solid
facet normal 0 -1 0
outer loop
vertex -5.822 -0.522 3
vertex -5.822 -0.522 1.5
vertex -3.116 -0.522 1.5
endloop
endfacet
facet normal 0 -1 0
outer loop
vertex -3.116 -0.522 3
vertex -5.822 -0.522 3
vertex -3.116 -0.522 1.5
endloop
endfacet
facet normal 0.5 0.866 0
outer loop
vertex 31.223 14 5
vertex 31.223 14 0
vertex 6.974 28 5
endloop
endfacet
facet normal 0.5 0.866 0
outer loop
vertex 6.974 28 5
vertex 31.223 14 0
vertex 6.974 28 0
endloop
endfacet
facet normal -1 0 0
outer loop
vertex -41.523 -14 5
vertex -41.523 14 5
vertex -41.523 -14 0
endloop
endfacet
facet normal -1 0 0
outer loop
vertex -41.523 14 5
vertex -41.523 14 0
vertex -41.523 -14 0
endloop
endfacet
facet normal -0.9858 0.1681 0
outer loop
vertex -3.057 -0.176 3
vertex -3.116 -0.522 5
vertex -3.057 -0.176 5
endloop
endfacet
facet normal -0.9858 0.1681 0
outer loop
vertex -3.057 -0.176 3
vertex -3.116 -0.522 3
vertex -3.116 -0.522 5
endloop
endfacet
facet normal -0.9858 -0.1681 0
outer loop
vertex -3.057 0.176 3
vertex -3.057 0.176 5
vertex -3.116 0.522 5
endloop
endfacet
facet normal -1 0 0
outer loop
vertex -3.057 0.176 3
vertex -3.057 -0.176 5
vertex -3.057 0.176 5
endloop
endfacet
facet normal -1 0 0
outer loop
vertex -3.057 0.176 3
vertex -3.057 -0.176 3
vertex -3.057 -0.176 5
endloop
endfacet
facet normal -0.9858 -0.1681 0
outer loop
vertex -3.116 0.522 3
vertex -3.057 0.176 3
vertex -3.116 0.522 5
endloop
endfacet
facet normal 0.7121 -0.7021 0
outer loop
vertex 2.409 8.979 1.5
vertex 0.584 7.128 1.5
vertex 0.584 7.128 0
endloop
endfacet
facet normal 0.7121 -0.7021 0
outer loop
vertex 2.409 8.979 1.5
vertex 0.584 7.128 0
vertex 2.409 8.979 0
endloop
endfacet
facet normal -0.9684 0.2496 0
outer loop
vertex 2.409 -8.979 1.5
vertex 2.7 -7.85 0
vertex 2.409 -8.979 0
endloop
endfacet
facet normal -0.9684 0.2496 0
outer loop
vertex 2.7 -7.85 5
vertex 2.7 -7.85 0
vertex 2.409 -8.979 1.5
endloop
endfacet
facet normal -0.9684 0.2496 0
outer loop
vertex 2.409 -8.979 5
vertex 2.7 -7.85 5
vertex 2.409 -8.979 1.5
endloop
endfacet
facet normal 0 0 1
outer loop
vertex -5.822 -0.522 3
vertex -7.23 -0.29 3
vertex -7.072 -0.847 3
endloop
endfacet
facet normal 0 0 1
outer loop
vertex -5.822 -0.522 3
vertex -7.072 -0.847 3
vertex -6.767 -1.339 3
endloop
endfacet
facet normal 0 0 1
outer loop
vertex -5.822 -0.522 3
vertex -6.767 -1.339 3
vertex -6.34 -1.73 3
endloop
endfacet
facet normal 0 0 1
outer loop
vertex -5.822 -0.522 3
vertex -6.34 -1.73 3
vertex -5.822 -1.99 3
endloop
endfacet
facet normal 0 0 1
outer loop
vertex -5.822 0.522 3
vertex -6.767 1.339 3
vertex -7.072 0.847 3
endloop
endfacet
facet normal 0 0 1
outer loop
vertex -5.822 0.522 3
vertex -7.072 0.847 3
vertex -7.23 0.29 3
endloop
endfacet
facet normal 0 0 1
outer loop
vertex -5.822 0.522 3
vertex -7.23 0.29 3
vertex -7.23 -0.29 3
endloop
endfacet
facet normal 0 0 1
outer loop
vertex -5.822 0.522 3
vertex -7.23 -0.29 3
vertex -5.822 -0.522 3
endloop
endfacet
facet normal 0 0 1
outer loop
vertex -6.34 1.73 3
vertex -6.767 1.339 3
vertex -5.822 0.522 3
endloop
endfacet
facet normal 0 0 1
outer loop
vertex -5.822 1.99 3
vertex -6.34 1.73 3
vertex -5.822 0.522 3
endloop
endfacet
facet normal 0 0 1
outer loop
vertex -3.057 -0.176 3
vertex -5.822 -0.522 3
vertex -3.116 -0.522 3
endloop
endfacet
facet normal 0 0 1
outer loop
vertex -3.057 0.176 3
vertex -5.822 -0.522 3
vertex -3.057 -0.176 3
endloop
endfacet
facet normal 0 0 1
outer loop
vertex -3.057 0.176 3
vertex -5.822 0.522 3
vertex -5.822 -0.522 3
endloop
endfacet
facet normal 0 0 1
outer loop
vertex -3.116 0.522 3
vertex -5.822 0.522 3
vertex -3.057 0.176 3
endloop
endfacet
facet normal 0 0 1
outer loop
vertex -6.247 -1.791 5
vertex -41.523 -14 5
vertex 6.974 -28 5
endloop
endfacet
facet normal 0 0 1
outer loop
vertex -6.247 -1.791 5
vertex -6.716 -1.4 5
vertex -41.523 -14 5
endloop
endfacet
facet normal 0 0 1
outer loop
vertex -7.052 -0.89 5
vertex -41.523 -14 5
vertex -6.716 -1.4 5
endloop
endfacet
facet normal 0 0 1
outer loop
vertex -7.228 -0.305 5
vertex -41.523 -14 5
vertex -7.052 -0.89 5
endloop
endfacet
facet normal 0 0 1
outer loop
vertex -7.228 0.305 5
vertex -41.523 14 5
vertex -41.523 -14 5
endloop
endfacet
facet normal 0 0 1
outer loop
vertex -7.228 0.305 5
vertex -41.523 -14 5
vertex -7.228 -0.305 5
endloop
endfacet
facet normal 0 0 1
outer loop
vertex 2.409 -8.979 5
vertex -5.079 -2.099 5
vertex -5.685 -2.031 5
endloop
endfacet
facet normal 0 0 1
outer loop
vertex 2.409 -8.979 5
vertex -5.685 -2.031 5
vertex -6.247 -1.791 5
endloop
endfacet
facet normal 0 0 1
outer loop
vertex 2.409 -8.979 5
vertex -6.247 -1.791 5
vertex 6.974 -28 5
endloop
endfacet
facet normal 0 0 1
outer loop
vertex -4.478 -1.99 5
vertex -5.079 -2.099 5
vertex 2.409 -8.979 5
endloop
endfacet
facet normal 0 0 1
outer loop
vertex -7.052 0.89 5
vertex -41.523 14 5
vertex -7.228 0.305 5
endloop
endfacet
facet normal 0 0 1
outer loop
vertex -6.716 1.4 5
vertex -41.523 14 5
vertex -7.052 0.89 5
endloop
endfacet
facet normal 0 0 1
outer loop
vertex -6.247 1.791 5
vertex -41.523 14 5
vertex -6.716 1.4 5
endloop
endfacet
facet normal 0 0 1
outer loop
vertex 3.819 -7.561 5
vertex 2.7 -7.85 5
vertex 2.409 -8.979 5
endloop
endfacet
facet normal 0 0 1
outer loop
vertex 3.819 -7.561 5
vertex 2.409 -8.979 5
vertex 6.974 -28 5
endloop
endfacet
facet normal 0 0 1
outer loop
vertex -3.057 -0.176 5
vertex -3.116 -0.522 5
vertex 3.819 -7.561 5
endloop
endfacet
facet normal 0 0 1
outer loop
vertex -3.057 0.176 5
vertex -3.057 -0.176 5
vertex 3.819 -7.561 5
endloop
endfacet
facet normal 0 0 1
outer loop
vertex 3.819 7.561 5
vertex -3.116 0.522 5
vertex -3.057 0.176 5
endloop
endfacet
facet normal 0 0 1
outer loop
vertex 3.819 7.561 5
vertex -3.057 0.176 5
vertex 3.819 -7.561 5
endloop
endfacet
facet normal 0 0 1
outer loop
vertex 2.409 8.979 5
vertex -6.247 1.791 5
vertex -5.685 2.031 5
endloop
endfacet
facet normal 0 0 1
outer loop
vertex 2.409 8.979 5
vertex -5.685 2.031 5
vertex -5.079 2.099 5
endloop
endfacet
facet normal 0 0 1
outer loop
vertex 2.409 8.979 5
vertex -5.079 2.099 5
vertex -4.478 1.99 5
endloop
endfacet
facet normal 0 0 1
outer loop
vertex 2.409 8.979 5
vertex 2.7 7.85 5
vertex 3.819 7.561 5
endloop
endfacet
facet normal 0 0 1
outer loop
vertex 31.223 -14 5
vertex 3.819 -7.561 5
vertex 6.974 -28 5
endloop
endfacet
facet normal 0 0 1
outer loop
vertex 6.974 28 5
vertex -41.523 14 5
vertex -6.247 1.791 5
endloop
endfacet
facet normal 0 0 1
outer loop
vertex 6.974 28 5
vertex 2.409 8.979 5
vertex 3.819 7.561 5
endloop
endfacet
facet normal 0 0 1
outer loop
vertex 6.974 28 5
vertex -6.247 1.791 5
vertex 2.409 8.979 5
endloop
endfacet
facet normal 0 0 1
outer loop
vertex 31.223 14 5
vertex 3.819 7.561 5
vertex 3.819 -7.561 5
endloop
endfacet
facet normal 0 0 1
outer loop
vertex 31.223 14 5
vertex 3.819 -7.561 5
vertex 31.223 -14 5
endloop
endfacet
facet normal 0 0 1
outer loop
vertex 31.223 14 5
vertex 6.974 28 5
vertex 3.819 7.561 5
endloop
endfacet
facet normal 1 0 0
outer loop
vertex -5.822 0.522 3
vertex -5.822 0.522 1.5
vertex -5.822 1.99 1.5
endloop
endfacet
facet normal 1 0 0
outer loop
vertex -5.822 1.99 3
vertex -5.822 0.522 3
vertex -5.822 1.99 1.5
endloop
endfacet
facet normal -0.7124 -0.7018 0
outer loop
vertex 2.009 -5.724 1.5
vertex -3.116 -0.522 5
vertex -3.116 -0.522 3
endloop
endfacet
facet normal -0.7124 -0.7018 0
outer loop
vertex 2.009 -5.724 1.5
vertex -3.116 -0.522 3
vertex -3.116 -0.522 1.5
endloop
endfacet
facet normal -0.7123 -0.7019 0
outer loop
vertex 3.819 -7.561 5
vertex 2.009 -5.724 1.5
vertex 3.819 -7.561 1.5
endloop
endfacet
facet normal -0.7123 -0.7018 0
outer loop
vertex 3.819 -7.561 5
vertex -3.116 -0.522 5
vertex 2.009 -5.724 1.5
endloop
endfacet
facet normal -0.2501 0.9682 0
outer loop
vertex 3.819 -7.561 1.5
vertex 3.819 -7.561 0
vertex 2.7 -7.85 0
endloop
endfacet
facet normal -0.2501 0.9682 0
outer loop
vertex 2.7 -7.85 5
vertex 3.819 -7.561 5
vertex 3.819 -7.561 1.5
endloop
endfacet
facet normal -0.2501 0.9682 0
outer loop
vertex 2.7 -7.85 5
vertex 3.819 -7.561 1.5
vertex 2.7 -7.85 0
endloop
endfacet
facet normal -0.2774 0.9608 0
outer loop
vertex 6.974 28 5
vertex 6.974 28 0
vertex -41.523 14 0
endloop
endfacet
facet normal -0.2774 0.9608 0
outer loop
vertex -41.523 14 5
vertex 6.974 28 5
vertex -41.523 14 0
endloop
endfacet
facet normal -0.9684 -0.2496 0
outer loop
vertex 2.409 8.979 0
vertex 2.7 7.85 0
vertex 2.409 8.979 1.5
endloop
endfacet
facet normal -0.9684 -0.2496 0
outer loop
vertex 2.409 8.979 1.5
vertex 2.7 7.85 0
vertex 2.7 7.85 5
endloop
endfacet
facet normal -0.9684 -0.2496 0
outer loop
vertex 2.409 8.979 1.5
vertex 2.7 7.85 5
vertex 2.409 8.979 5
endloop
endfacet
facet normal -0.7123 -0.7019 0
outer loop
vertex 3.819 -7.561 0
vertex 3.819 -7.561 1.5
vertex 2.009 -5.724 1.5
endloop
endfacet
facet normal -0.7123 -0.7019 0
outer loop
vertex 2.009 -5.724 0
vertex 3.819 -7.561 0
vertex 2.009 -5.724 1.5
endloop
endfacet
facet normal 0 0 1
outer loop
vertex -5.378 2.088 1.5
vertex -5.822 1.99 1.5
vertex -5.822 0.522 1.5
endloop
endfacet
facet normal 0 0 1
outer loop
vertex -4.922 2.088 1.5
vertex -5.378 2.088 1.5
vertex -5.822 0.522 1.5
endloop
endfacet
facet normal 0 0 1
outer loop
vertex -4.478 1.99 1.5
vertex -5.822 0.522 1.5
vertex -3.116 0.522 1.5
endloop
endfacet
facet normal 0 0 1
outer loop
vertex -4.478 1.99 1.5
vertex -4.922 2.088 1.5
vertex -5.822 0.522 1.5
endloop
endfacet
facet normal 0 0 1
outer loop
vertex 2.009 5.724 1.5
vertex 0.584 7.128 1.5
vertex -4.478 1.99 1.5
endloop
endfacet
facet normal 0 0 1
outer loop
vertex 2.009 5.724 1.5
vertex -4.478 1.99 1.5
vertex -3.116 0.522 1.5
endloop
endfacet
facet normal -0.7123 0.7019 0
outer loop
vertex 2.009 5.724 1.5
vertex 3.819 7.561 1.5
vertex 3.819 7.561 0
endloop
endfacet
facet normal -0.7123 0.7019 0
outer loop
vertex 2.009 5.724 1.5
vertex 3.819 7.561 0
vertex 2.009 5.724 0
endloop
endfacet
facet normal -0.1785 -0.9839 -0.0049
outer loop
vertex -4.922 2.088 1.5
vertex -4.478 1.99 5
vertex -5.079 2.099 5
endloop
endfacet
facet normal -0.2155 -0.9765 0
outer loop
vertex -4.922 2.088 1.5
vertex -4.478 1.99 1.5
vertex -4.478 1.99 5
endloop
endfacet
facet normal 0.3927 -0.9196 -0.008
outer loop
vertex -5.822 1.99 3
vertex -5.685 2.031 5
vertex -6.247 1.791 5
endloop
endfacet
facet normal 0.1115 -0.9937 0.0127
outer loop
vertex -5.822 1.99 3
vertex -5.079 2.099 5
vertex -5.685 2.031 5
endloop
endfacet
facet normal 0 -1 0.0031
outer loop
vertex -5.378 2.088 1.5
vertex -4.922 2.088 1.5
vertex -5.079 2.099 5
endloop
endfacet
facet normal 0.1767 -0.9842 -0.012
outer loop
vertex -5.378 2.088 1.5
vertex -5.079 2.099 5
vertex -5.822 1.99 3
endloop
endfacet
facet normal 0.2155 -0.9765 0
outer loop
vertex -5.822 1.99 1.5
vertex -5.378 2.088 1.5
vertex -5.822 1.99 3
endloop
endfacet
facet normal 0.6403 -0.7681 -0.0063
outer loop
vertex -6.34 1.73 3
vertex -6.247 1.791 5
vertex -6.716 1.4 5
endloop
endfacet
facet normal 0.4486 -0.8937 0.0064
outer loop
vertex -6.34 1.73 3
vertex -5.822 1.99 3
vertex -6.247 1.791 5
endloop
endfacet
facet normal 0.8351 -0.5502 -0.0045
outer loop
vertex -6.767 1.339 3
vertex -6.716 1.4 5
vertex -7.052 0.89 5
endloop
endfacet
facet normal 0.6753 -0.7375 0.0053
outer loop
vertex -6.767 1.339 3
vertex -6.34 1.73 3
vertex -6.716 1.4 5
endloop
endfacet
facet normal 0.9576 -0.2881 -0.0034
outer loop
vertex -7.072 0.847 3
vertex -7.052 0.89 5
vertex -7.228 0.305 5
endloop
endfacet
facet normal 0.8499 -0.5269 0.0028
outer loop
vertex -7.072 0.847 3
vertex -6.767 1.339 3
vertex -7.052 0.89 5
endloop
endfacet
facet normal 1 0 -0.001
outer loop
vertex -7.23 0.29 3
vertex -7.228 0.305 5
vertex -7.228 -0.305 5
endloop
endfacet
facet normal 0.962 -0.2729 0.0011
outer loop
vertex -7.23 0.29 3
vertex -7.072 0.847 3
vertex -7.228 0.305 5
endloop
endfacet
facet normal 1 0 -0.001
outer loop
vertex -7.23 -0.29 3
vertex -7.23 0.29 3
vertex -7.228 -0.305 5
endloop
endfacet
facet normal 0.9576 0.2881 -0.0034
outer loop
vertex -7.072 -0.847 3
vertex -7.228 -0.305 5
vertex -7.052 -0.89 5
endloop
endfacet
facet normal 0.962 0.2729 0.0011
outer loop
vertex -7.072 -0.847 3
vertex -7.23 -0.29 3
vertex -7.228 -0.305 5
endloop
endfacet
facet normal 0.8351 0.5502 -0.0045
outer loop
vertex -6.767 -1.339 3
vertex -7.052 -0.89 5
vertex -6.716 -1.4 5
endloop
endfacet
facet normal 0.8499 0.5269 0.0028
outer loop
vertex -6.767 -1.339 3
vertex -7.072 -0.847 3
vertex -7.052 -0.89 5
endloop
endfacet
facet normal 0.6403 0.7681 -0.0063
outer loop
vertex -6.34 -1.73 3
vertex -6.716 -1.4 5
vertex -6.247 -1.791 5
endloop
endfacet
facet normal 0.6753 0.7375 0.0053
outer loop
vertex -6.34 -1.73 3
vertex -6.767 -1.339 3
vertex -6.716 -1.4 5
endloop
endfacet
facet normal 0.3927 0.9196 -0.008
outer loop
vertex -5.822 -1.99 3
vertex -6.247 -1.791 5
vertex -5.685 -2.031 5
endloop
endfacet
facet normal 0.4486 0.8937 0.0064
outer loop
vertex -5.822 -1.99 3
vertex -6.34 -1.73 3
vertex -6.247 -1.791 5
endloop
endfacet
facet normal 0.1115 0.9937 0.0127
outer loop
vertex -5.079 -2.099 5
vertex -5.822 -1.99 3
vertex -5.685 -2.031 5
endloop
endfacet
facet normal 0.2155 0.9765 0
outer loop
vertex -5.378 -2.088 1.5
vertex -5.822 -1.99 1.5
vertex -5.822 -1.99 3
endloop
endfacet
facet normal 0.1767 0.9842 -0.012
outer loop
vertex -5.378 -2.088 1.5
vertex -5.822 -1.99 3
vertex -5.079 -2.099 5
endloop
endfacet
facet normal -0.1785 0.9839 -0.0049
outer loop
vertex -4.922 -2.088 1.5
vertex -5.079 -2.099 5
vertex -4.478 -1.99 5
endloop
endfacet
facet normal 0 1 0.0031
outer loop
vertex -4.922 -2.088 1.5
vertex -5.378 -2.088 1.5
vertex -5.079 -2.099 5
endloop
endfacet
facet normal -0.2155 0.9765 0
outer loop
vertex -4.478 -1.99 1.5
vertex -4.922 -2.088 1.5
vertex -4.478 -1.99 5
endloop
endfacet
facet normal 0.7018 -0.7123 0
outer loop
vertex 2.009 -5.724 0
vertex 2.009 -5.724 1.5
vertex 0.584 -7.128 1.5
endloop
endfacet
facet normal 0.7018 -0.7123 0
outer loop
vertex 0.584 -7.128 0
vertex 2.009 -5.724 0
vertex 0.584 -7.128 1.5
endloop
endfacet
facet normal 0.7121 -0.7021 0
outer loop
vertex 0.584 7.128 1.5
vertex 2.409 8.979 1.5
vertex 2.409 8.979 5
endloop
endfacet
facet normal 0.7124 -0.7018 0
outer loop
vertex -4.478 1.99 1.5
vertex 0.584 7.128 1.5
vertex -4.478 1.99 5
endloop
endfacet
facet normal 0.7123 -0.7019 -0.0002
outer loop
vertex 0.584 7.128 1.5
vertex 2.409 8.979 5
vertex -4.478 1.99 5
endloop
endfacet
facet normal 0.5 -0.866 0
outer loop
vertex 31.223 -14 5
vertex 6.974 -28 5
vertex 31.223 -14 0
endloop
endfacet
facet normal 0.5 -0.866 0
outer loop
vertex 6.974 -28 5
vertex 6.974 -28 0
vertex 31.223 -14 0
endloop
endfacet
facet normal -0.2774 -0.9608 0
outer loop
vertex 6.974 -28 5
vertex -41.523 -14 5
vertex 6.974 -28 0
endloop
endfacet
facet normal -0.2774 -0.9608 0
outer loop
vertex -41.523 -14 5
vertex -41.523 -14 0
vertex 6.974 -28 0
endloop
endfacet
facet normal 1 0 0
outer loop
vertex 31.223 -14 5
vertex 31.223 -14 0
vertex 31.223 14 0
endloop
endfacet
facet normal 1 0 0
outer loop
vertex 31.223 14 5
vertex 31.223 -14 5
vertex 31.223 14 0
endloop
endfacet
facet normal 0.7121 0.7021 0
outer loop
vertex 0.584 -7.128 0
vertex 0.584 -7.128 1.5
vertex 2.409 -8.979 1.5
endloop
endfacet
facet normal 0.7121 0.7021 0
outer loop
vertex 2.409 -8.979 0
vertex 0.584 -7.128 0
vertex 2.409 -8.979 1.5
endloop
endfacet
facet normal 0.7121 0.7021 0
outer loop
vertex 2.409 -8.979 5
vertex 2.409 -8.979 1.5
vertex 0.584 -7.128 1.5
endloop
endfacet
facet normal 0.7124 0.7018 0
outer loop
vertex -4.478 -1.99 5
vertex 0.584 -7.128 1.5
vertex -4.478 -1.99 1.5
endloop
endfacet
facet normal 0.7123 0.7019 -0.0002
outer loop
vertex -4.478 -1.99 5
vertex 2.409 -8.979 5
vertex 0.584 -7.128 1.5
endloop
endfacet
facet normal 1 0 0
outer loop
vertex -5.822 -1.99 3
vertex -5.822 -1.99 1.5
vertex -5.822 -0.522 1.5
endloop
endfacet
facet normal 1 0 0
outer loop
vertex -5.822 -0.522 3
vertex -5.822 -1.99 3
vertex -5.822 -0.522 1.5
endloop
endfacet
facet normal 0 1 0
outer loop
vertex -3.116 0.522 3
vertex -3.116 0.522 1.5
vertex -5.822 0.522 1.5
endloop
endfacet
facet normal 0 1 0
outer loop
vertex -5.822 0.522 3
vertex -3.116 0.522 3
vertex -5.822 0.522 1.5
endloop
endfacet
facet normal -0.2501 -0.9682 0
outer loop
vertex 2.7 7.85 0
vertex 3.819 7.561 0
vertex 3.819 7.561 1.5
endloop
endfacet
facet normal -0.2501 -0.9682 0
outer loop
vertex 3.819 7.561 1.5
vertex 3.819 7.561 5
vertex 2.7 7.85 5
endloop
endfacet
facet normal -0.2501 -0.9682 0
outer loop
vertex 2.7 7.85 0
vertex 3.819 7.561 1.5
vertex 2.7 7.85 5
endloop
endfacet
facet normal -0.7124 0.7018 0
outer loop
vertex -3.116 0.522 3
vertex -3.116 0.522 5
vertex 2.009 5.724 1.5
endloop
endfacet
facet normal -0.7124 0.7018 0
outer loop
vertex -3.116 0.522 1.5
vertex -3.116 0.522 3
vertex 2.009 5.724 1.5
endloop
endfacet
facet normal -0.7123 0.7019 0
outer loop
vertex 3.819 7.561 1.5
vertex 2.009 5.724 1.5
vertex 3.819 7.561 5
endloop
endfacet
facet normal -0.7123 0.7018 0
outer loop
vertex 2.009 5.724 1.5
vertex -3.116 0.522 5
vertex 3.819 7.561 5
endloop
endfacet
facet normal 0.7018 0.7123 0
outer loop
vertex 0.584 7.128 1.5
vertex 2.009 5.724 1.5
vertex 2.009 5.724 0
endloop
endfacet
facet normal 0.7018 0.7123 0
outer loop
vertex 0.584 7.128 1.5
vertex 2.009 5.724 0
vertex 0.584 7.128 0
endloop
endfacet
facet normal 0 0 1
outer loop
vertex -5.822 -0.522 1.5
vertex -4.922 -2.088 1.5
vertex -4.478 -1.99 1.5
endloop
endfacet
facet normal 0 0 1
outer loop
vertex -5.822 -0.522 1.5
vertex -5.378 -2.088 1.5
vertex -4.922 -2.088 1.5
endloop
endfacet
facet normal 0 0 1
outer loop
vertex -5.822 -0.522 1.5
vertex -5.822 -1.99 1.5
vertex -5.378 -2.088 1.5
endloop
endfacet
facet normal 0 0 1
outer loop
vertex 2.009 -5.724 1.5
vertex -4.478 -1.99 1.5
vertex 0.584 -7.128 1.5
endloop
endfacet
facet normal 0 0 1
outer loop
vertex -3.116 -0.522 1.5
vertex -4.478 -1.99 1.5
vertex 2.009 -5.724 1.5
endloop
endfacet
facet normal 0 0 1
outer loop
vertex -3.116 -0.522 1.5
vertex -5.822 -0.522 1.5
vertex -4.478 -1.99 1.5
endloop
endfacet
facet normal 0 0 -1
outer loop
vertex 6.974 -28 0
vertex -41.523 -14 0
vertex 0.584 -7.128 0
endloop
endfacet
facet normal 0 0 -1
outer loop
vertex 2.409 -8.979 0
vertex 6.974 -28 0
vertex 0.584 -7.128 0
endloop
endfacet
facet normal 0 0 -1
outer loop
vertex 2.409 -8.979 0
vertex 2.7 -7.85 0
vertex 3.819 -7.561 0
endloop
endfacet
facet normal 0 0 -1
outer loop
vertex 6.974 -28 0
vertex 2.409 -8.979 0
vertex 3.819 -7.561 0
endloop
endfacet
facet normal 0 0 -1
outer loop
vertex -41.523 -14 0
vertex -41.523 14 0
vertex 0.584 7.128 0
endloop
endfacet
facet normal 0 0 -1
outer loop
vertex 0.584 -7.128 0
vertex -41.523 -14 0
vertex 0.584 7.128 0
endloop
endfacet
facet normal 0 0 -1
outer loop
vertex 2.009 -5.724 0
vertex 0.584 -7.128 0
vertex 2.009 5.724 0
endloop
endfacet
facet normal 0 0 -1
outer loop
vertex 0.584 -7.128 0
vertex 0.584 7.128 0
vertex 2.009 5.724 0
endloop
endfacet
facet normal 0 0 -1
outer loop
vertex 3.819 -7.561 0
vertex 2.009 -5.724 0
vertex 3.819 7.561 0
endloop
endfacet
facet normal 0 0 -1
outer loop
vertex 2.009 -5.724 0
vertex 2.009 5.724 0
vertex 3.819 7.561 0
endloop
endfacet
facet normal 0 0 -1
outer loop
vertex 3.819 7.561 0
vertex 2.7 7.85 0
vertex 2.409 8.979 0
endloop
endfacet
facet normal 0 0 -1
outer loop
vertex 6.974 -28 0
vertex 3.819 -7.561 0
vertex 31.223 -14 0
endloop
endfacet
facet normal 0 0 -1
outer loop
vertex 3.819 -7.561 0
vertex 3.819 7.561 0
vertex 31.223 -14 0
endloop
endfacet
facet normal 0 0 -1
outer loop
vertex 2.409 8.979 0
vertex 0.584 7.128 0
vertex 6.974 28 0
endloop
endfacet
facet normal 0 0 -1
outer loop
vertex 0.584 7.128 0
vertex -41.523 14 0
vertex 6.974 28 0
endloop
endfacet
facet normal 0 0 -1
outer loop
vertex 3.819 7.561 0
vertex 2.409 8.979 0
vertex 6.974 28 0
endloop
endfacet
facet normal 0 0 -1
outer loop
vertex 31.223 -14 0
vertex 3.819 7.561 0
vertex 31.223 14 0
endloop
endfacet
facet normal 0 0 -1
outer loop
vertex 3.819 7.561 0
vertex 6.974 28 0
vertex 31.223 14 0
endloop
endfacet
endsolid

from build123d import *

# Parameters (mm, degrees)
BOSS_EXTRUDE1_DEPTH = 1.5
SKETCH4_R           = 2.1
BOSS_EXTRUDE2_DEPTH = 3.5
CUT_EXTRUDE1_DEPTH  = 3.5
CUT_EXTRUDE2_DEPTH  = 51.203735814
BOSS_EXTRUDE3_DEPTH = 1.5


with BuildPart() as part:
    # Sketch2 → Boss-Extrude1 (new body)
    with BuildSketch(Plane.XY):
        Polygon((-41.523066959, 14), (-41.523066959, -14), (6.974355653, -28), (31.223066959, -14), (31.223066959, 14), (6.974355653, 28), align=None)
    extrude(amount=BOSS_EXTRUDE1_DEPTH)

    # Sketch4 → Boss-Extrude2 (add)
    with BuildSketch(Plane.XY.offset(1.5)):
        Polygon((6.974355653, 28), (-41.523066959, 14), (-41.523066959, -14), (6.974355653, -28), (31.223066959, -14), (31.223066959, 14), align=None)
        with Locations((-5.15, 0)):
            Circle(SKETCH4_R, mode=Mode.SUBTRACT)
    extrude(amount=BOSS_EXTRUDE2_DEPTH)

    # Sketch5 → Cut-Extrude1 (cut)
    with BuildSketch(Plane.XY.offset(5)):
        Polygon((-4.477861471, 1.989530045), (-5.822138529, 1.989530045), (-5.822138529, 0.522265885), (-3.115979758, 0.522265885), (3.819278422, 7.561255379), (2.700425446, 7.850425446), (2.408714576, 8.979109263), align=None)
    cut_extrude1 = extrude(amount=-CUT_EXTRUDE1_DEPTH, mode=Mode.SUBTRACT)

    # Sketch9 → Cut-Extrude2 (cut, through all)
    with BuildSketch(Plane.XY.offset(1.5)):
        Polygon((2.408714576, 8.979109263), (2.700425446, 7.850425446), (3.819278422, 7.561255379), (2.009048725, 5.723949904), (0.584447895, 7.127556852), align=None)
    cut_extrude2 = extrude(amount=-CUT_EXTRUDE2_DEPTH, mode=Mode.SUBTRACT)

    # Mirror1: Cut-Extrude1, Cut-Extrude2 across plane
    add(cut_extrude1.mirror(Plane(origin=(0, 0, 0), x_dir=(0, 0, 1), z_dir=(0, -1, 0))), mode=Mode.SUBTRACT)
    add(cut_extrude2.mirror(Plane(origin=(0, 0, 0), x_dir=(0, 0, 1), z_dir=(0, -1, 0))), mode=Mode.SUBTRACT)

    # Sketch8 → Boss-Extrude3 (add)
    with BuildSketch(Plane.XY.offset(1.5)):
        with BuildLine():
            Line((-5.822138529, 0.522265885), (-5.822138529, 1.989530045))
            ThreePointArc((-5.822138529, 1.989530045), (-7.25, 0), (-5.822138529, -1.989530045))
            Line((-5.822138529, -1.989530045), (-5.822138529, -0.522265885))
            Line((-5.822138529, -0.522265885), (-3.115979758, -0.522265885))
            ThreePointArc((-3.115979758, -0.522265885), (-3.05, 0), (-3.115979758, 0.522265885))
            Line((-3.115979758, 0.522265885), (-5.822138529, 0.522265885))
        make_face()
    extrude(amount=BOSS_EXTRUDE3_DEPTH)


solid = part.part
